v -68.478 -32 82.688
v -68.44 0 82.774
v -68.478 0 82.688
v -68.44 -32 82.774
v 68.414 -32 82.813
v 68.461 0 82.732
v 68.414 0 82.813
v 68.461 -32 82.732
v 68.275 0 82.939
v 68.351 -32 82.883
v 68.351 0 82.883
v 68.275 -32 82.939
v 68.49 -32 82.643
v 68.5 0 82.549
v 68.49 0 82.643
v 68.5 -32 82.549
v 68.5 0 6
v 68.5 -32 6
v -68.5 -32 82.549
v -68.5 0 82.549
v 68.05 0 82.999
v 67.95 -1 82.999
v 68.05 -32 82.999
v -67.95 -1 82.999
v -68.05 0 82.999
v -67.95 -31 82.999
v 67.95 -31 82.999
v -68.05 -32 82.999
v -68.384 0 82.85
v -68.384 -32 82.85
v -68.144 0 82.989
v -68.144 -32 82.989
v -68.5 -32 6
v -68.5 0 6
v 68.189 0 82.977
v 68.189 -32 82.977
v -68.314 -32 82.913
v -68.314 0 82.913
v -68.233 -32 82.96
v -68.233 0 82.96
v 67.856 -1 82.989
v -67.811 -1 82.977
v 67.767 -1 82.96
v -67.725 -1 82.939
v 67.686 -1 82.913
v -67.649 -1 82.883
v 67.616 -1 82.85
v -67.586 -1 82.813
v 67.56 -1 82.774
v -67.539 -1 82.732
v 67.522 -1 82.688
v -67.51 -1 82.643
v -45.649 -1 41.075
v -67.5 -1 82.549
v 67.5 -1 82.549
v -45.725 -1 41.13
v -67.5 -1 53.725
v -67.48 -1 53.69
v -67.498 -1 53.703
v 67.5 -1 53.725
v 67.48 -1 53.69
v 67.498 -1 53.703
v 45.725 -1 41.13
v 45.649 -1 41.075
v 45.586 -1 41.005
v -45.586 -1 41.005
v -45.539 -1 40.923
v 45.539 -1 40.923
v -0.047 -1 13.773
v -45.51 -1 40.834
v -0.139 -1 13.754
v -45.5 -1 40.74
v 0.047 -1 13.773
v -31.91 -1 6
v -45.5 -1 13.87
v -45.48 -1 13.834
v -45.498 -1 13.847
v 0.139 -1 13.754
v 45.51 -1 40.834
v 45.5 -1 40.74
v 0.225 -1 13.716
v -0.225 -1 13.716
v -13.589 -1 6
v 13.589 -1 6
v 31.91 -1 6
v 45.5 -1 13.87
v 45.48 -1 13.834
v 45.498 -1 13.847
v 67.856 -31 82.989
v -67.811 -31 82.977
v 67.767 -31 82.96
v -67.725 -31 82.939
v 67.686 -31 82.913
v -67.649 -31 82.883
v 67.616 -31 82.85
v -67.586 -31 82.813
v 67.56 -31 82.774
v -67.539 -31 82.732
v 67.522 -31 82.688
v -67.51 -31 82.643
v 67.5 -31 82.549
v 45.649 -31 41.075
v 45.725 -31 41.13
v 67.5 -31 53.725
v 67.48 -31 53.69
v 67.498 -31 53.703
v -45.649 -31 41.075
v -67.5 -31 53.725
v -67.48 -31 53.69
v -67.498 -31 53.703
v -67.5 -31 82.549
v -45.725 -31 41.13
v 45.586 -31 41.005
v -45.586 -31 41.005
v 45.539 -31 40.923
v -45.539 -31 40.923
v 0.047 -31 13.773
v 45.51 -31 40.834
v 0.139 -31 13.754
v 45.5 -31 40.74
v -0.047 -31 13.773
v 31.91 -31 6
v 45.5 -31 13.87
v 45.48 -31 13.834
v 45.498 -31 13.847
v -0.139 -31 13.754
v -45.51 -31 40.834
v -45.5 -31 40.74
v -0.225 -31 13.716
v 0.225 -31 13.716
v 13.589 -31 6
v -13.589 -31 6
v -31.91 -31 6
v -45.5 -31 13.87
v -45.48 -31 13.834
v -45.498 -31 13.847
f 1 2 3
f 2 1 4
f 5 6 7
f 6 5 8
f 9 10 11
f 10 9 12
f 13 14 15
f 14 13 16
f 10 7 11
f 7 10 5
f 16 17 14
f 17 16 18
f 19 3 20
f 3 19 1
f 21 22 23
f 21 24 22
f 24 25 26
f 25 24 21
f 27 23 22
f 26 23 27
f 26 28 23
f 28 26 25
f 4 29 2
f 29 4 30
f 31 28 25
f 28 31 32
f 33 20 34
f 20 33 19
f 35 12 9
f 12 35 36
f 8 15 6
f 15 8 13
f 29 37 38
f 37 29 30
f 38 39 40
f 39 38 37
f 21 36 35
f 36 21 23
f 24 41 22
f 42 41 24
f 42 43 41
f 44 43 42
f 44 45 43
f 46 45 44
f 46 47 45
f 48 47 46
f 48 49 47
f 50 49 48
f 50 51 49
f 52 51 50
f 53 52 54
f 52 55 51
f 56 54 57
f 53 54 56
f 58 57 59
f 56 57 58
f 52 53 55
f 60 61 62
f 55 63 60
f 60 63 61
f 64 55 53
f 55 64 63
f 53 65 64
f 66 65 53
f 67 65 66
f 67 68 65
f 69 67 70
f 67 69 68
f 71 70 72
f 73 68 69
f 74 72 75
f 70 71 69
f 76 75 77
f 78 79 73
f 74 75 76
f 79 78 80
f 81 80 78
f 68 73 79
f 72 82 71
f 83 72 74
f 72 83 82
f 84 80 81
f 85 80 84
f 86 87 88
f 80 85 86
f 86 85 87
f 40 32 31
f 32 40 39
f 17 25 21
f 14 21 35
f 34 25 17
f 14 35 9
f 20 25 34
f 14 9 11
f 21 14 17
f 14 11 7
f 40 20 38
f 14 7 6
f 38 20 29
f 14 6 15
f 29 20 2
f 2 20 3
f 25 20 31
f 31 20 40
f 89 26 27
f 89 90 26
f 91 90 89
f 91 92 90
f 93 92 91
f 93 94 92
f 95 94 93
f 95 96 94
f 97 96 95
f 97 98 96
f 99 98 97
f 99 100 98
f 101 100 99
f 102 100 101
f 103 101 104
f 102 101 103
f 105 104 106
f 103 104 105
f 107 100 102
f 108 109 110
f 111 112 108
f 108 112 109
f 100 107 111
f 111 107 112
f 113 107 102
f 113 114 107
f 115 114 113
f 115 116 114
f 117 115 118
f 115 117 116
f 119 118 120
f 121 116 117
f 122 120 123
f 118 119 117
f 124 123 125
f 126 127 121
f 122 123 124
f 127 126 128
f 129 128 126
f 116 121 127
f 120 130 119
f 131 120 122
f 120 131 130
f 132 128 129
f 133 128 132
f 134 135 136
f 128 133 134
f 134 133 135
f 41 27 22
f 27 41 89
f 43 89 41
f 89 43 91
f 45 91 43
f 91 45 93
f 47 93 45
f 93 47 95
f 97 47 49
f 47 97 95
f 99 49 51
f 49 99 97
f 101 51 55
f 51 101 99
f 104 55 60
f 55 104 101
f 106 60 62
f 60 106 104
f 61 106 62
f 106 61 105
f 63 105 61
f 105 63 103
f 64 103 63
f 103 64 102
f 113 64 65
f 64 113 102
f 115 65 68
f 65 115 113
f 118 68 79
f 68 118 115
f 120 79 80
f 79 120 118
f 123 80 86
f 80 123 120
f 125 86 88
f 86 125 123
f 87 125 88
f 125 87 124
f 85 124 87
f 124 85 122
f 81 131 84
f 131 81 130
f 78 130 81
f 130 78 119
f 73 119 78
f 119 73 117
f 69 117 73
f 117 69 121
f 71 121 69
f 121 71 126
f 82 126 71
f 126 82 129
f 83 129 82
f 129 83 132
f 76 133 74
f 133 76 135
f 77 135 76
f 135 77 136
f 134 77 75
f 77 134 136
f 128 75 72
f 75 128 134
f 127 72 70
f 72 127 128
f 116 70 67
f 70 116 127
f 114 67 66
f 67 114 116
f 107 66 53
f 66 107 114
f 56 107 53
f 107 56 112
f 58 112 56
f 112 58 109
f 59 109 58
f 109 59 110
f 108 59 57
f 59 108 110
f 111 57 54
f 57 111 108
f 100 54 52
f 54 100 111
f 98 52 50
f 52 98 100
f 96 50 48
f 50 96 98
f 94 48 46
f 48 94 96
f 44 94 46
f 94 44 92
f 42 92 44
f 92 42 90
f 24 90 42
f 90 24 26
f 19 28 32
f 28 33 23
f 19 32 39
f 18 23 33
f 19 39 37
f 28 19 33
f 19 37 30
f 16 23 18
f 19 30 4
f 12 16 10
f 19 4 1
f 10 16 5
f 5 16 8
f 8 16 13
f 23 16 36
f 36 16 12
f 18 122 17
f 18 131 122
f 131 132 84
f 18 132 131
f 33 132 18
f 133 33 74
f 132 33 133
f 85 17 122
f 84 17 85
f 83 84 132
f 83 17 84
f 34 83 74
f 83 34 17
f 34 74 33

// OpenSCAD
eps = 0.001;

// Cavity dimensions.
major_width = 133;
major_height = 82;
minor_width = 89;
minor_height = 40;

cavity_length = 30;

wall = 1; // TODO: thicker
roundoff = min(wall*0.45, 1.8);

module cavity_2d(boxy=false) {
  flat = 1;
  for (a = [-1, 1]) {
    scale([a, 1]) {
      polygon([
        [-eps, boxy ? 0 : minor_width*tan(30)/4],
        [minor_width/4, 0],
        [minor_width/4 + flat, 0],
        [minor_width/2 + flat, boxy ? 0 : minor_width*tan(30)/4],
        [minor_width/2 + flat, boxy ? 0 : minor_height],
        [major_width/2 + flat, boxy ? 0 : minor_height + (major_width-minor_width)*tan(30)/2],
        [major_width/2 + flat, major_height],
        [-eps, major_height],
      ]);
    }
  }
}

module inner_profile_2d(boxy=false) {
  offset(roundoff, $fn=30) {
    offset(-roundoff) {
      translate([0, wall]) {
        difference() {
          offset(delta=wall)
            cavity_2d(boxy=boxy);
          cavity_2d(boxy=false);
          
          // Cut off the ceiling.
          translate([-500, major_height - eps])
            square(1000);
        }
      }
    }
  }
}

module end_profile_2d() {
  hull()
    inner_profile_2d(boxy=true);
}

module tray() {
  end_wall = 1; // TODO: thicker
  
  difference() {
    rotate([90, 0, 0]) {
      linear_extrude(end_wall) end_profile_2d();
      translate([0, 0, end_wall]) linear_extrude(cavity_length) inner_profile_2d(boxy=true);
      translate([0, 0, end_wall+cavity_length]) linear_extrude(end_wall) end_profile_2d();
    }
    
    for (y = [0, -end_wall*2 - cavity_length])
      translate([0, y])
        rotate([45, 0, 0])
          cube([1000, 0.5, 0.5], center=true);
  }
}

difference() {
  tray();
  cube([1000, 1000, 12], center=true);
}
